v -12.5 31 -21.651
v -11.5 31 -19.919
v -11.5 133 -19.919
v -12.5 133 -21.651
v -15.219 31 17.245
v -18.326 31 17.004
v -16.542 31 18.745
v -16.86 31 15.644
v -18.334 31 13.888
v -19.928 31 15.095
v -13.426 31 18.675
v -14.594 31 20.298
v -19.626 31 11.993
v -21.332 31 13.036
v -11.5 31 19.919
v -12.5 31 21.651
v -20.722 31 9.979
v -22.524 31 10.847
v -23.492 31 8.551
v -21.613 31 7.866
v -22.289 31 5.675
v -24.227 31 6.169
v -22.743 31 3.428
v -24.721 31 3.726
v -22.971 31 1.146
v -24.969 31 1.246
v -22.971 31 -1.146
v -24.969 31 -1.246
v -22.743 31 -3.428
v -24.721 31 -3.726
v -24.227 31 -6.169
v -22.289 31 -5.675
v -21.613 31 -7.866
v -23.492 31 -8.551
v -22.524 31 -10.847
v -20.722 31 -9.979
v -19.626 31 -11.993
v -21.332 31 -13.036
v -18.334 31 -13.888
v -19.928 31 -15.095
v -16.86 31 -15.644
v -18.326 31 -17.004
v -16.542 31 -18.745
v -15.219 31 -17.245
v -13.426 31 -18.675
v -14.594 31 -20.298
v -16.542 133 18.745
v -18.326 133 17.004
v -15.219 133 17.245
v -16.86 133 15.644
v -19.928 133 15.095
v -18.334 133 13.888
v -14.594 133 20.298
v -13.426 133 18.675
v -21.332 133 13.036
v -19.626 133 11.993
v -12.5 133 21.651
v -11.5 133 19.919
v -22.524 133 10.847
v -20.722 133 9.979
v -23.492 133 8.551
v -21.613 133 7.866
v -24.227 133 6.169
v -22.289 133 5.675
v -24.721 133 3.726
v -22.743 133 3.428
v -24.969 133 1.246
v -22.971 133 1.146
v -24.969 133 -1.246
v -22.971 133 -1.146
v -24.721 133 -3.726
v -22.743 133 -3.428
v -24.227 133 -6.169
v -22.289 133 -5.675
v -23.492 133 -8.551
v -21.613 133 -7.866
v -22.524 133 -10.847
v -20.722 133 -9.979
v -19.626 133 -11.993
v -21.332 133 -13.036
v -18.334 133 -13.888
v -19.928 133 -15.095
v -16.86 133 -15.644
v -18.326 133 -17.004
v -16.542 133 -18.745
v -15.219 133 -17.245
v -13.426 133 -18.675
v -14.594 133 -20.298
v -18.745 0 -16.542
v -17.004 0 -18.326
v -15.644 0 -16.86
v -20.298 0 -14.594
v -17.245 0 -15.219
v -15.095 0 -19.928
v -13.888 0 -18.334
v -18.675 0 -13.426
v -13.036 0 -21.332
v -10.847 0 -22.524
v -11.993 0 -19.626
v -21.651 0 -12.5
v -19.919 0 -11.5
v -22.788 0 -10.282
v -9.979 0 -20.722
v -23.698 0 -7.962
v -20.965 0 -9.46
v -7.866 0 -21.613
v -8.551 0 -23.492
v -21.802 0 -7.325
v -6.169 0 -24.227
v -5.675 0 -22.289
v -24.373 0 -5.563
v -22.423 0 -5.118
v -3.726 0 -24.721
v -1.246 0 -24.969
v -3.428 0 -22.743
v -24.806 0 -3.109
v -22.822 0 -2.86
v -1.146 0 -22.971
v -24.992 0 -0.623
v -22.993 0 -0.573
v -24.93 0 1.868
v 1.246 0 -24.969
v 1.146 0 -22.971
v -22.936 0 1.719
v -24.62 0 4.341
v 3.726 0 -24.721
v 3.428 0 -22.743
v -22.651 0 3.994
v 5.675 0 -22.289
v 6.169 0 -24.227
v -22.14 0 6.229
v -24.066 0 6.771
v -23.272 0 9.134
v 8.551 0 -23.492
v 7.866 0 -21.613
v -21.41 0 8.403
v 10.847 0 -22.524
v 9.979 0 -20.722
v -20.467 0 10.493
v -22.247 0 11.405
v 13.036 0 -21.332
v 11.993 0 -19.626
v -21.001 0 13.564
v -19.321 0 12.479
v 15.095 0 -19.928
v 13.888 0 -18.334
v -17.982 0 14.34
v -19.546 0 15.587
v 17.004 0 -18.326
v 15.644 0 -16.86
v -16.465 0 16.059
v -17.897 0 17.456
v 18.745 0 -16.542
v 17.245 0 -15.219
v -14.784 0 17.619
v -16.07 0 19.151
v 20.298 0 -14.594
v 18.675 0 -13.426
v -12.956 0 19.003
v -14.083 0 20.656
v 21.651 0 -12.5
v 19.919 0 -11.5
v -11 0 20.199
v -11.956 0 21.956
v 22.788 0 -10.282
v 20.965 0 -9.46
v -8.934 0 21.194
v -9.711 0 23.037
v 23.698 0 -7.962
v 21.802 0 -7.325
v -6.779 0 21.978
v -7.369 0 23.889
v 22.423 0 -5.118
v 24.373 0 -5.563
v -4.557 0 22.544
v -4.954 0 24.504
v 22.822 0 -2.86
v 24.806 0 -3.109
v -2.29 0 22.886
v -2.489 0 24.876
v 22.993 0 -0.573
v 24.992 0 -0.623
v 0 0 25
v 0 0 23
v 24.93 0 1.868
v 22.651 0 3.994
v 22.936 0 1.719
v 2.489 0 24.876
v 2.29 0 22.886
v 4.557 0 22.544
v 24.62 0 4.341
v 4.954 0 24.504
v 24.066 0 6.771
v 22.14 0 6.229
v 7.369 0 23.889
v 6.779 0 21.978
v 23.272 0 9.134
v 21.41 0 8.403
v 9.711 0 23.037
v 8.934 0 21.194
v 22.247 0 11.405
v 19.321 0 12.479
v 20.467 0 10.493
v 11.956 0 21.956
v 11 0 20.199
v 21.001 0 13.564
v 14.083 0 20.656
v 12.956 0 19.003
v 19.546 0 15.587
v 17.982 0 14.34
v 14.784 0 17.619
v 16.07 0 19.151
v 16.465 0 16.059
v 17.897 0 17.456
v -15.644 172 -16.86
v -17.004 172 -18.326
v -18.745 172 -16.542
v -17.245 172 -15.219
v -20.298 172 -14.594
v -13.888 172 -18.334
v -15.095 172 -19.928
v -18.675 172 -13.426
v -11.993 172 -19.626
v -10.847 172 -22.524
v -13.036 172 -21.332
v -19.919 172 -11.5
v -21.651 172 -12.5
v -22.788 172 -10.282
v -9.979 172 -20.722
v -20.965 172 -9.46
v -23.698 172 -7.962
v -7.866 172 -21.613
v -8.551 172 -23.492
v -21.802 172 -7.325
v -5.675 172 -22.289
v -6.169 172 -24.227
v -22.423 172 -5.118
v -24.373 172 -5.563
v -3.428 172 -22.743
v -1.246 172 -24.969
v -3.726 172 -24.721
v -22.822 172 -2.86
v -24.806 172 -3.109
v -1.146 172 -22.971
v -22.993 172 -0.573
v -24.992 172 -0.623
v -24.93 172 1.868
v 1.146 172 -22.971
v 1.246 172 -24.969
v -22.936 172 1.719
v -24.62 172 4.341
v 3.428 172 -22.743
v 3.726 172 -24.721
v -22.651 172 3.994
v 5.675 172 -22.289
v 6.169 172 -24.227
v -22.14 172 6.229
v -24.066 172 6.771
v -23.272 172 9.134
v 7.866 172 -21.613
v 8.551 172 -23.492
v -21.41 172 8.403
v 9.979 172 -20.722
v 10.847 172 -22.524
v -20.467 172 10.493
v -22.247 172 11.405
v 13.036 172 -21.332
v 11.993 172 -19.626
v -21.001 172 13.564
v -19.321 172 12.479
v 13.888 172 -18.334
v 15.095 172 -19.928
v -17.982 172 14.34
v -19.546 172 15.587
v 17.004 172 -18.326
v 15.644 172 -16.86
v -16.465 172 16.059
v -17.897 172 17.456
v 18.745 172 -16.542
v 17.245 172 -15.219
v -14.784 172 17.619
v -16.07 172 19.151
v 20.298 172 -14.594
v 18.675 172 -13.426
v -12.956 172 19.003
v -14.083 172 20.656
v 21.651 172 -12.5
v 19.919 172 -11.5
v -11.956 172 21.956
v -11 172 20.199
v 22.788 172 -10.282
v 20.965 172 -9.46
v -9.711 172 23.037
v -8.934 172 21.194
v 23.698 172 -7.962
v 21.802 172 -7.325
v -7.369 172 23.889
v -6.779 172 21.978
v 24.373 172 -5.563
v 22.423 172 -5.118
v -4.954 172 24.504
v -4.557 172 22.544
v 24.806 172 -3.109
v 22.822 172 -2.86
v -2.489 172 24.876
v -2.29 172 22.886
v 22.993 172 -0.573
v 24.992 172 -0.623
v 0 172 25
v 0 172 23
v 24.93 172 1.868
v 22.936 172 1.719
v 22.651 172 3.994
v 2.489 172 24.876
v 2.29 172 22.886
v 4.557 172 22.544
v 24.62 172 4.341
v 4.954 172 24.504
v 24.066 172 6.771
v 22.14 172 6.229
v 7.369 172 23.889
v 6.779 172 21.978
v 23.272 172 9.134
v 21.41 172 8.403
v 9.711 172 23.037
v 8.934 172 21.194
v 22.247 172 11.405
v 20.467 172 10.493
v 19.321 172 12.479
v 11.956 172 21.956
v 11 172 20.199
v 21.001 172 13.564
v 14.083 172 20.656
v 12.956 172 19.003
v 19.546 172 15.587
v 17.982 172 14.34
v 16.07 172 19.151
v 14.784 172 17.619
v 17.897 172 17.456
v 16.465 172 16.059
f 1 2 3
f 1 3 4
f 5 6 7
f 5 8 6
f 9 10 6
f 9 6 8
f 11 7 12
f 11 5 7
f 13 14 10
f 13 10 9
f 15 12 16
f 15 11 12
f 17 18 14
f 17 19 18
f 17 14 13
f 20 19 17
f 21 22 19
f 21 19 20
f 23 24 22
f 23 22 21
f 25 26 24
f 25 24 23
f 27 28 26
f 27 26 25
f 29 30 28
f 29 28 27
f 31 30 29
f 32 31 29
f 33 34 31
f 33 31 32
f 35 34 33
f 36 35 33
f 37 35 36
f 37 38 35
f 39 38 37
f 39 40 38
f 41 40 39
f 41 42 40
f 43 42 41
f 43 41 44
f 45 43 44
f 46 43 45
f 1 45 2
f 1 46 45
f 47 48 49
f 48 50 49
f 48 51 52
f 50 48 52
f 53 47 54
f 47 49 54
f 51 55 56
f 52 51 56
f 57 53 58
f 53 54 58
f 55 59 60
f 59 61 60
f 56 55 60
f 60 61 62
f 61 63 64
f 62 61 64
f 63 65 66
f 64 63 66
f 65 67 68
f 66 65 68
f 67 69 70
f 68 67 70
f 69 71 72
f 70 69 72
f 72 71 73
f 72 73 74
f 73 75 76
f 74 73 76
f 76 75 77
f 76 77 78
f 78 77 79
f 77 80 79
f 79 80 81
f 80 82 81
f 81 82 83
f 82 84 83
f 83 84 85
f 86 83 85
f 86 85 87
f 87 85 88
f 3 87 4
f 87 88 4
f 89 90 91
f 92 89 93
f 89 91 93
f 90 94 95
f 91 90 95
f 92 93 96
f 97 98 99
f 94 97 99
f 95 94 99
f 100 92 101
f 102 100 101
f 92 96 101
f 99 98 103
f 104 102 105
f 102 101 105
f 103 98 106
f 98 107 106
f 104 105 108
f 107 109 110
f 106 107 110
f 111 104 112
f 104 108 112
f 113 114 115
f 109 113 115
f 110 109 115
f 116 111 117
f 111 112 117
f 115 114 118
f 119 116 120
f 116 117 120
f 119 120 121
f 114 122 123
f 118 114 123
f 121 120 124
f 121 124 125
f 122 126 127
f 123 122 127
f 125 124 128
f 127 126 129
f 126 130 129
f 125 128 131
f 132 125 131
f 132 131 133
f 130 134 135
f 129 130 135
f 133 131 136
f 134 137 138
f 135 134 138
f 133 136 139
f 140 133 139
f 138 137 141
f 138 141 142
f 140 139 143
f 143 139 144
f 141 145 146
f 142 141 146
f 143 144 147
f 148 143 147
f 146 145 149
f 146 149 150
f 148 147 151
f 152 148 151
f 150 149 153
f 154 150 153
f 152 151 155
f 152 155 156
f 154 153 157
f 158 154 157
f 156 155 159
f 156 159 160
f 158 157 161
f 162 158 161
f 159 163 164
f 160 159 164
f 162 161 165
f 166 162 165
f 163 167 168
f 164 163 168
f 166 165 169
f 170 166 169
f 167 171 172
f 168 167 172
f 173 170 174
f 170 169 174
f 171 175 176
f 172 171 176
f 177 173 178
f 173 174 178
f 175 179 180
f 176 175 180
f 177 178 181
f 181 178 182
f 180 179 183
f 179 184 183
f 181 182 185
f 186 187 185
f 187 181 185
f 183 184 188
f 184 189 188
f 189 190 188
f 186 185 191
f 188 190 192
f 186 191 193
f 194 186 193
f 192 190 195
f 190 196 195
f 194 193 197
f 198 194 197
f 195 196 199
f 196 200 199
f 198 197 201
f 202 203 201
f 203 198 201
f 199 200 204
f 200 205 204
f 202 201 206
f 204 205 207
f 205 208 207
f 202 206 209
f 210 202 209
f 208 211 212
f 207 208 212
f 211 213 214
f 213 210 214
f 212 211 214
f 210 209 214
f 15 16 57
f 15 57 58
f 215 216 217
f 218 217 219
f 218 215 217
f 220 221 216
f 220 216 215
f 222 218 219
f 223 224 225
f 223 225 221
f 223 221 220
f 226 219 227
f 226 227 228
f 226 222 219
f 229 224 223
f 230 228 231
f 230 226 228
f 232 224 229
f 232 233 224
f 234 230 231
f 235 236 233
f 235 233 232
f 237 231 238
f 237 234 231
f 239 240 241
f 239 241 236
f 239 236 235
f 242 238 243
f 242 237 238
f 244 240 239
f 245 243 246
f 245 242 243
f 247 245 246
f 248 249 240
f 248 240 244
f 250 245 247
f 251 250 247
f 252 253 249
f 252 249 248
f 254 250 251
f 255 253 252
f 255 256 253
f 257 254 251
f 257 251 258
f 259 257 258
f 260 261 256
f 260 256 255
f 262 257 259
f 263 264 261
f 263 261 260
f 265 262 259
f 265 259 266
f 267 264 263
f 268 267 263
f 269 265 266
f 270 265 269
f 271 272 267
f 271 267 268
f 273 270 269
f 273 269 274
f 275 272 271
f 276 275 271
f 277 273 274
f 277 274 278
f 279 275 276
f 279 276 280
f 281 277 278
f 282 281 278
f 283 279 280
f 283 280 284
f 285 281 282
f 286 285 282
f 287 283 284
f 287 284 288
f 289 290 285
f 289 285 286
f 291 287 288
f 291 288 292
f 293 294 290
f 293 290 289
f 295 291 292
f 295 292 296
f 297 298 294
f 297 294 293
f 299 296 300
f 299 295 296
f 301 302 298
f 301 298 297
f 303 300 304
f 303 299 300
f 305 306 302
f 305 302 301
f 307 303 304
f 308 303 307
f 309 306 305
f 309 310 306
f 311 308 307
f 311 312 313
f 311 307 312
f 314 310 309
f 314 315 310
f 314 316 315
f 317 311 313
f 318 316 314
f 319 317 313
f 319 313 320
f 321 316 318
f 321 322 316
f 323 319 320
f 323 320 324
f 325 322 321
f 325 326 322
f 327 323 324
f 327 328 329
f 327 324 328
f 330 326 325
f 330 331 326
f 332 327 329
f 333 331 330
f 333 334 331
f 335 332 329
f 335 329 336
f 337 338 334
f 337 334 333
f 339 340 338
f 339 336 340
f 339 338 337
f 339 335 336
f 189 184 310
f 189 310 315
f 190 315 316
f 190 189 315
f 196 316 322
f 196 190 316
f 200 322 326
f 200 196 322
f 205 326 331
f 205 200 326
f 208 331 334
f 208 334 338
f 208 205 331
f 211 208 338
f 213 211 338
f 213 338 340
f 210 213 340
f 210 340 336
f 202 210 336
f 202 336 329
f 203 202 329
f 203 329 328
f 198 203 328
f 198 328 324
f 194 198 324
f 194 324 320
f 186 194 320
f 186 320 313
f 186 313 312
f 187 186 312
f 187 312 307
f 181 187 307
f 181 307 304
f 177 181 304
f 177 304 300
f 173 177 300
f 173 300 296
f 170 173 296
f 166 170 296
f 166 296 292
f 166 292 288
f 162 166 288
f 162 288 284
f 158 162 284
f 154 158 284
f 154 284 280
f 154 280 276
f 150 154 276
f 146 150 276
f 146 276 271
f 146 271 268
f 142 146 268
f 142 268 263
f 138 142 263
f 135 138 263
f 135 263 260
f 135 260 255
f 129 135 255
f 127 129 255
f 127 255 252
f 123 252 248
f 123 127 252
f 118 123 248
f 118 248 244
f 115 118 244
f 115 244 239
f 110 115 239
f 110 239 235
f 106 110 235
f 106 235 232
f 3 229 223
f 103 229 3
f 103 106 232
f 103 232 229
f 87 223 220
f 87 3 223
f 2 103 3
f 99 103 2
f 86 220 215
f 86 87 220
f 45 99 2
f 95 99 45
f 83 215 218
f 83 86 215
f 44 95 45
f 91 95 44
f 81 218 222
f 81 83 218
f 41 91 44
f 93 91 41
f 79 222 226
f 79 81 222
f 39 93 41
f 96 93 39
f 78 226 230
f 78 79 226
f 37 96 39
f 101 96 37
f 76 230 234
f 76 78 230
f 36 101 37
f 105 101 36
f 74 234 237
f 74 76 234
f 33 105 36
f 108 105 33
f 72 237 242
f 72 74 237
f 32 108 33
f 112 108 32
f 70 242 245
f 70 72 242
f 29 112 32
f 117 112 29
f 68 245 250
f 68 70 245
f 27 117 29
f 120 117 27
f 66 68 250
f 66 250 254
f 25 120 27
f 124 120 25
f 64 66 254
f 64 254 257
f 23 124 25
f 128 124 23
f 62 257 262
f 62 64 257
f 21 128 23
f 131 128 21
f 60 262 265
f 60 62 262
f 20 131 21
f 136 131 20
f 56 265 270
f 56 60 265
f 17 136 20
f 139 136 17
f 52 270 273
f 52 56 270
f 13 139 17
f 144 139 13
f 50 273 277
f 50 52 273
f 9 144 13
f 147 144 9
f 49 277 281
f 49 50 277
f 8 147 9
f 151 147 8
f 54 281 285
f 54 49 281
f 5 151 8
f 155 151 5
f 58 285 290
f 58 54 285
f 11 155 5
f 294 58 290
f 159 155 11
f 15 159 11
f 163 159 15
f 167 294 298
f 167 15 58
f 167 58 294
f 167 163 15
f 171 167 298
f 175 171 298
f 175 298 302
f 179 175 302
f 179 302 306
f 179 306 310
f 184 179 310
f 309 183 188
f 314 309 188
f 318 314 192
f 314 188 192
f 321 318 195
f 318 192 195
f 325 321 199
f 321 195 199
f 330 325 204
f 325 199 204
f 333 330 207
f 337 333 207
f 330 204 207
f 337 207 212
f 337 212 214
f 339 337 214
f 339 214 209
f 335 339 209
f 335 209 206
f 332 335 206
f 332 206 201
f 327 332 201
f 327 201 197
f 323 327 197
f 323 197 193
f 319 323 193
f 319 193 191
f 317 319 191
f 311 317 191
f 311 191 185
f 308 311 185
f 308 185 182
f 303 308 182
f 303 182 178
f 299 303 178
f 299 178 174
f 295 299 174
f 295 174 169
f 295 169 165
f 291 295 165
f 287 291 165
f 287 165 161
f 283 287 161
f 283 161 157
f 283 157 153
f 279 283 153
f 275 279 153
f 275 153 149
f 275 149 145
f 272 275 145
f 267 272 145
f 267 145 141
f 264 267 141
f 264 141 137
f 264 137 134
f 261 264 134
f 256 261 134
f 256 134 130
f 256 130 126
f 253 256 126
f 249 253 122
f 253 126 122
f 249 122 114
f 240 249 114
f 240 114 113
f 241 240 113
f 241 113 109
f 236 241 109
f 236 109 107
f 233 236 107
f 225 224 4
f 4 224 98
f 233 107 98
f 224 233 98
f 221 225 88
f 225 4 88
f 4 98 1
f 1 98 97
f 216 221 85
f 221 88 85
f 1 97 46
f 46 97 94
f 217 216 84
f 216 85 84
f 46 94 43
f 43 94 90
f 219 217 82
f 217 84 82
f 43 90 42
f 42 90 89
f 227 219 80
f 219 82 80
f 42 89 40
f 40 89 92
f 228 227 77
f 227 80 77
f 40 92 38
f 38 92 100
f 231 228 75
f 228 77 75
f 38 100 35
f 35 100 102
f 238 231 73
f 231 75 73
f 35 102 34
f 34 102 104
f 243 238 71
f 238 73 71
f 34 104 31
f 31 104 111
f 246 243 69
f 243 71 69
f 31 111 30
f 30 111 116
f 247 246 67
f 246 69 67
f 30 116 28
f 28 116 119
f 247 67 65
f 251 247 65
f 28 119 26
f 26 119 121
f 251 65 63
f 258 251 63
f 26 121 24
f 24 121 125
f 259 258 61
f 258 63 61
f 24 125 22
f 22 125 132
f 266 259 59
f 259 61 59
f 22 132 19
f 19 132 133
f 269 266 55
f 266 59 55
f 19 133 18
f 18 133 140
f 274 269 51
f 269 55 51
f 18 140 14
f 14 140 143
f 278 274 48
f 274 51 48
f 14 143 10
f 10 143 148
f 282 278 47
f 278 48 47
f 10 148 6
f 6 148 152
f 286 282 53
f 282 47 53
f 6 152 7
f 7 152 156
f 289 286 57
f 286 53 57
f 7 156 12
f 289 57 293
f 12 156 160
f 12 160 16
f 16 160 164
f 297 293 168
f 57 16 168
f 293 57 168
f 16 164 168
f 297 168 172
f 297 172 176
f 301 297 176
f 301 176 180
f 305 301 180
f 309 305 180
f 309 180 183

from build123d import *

# Parameters (mm, degrees)
SKETCH_1_R          = 25
SKETCH_1_R_2        = 23
EXTRUDE_1_DEPTH     = 172
CUT_EXTRUDE_1_DEPTH = 102


with BuildPart() as part:
    # Эскиз1 → Бобышка-Вытянуть1 (new body)
    with BuildSketch(Plane(origin=(0, 0, 0), x_dir=(1, 0, 0), z_dir=(0, 1, 0))):
        with Locations(Location((0, 0, 0), (0, 0, 270))):
            Circle(SKETCH_1_R)
        with Locations(Location((0, 0, 0), (0, 0, 270))):
            Circle(SKETCH_1_R_2, mode=Mode.SUBTRACT)
    extrude(amount=EXTRUDE_1_DEPTH)

    # Эскиз2 → Вырез-Вытянуть1 (cut)
    with BuildSketch(Plane(origin=(0, 31, 0), x_dir=(-1, 0, 0), z_dir=(0, -1, 0))):
        Polygon((0, 0), (29.61457633, 51.293950849), (33.452789958, -57.941931861), align=None)
    extrude(amount=-CUT_EXTRUDE_1_DEPTH, mode=Mode.SUBTRACT)


solid = part.part
